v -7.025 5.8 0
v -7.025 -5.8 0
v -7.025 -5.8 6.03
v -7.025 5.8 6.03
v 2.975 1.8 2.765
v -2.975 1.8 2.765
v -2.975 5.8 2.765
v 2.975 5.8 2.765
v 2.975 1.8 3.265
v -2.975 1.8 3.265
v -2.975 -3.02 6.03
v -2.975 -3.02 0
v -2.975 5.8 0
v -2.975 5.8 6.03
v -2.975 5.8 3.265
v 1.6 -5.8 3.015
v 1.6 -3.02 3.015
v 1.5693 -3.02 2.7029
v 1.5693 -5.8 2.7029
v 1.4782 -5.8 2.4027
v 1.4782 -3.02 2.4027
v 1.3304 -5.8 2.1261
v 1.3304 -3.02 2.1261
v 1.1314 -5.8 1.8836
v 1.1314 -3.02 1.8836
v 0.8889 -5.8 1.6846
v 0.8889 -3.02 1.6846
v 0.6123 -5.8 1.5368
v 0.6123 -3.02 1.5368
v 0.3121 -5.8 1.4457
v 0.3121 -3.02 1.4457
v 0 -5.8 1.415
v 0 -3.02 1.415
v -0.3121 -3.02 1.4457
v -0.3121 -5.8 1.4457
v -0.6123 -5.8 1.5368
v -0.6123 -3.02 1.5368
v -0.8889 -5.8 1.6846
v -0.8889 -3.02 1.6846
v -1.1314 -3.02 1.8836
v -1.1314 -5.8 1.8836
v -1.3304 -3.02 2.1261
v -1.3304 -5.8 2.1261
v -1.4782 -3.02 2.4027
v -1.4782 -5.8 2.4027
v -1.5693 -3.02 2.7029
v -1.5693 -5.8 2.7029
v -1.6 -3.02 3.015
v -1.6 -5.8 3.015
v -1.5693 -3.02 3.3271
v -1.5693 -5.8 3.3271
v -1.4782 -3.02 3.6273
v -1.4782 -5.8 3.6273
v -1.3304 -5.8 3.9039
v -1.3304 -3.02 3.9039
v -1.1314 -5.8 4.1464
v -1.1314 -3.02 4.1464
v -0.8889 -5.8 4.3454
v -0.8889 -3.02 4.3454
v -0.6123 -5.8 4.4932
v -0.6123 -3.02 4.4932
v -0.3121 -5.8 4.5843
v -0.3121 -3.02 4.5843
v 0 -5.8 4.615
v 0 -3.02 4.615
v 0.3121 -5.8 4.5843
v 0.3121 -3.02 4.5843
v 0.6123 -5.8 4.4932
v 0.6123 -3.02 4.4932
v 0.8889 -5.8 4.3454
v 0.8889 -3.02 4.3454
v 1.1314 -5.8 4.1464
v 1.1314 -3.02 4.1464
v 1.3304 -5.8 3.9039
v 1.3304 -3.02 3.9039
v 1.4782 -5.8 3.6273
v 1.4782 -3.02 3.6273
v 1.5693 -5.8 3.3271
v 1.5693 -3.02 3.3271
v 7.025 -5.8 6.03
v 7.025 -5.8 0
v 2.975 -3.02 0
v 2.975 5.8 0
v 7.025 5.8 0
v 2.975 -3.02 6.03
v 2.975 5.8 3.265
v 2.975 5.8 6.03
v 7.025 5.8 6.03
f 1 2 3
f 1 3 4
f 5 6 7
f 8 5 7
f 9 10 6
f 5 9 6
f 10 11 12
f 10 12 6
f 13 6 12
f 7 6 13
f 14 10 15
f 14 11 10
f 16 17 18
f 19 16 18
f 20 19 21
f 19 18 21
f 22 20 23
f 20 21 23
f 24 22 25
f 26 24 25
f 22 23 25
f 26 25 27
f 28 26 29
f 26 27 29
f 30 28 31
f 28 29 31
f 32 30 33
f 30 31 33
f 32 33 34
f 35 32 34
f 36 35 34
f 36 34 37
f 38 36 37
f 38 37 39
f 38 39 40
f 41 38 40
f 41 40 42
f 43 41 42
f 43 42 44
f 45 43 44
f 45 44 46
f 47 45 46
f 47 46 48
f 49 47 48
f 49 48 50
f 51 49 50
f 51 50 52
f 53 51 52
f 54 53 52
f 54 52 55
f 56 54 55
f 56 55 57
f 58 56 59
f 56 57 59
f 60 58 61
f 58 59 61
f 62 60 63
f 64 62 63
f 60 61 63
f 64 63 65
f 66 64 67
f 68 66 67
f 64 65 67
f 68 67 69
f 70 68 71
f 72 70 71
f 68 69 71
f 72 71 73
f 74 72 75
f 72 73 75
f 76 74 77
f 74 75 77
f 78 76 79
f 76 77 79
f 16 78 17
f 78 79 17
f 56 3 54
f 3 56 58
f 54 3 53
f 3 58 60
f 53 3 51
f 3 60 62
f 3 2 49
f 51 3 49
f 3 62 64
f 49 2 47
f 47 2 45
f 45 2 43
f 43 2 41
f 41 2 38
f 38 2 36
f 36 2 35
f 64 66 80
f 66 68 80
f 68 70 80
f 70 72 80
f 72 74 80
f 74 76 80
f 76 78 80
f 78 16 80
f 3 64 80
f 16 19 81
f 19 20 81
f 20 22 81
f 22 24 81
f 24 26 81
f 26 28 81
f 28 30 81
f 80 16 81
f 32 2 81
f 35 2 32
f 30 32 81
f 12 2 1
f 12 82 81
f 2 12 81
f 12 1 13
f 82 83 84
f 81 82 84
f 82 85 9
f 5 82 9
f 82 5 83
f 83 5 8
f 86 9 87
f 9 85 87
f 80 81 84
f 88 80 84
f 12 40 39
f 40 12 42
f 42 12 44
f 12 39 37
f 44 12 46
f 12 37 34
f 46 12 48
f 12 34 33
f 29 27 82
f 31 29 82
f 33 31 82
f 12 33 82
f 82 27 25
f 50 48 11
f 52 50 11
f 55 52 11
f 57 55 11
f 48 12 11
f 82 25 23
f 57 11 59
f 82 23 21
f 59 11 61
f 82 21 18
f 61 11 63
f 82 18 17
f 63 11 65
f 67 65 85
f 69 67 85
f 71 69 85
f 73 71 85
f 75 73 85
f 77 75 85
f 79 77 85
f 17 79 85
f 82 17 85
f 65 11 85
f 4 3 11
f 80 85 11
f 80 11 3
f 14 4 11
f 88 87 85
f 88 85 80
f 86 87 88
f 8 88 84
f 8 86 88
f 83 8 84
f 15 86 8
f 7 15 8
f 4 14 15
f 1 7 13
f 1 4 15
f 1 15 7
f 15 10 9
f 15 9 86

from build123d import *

# Parameters (mm, degrees)
SKETCH1_W                = 14.05
SKETCH1_H                = 11.6
BOSS_EXTRUDE1_DEPTH      = 6.03
SKETCH2_W                = 5.95
SKETCH2_H                = 8.82
CUT_EXTRUDE2_DEPTH       = 6.03
SKETCH3_W                = 0.5
SKETCH3_H                = 4
BOSS_EXTRUDE2_DEPTH      = 6.03
M3_CLEARANCE_HOLE1_D     = 3.2
M3_CLEARANCE_HOLE1_DEPTH = 2.78


with BuildPart() as part:
    # Sketch1 → Boss-Extrude1 (new body)
    with BuildSketch(Plane.XY):
        Rectangle(SKETCH1_W, SKETCH1_H)
    extrude(amount=BOSS_EXTRUDE1_DEPTH)

    # Sketch2 → Cut-Extrude2 (cut)
    with BuildSketch(Plane.XY.offset(6.03)):
        with Locations((0, 1.39)):
            Rectangle(SKETCH2_W, SKETCH2_H)
    extrude(amount=-CUT_EXTRUDE2_DEPTH, mode=Mode.SUBTRACT)

    # Sketch3 → Boss-Extrude2 (add)
    with BuildSketch(Plane(origin=(-2.975, 0, 0), x_dir=(0, 0, -1), z_dir=(1, 0, 0))):
        with Locations((-3.015, 3.8)):
            Rectangle(SKETCH3_W, SKETCH3_H)
    extrude(amount=BOSS_EXTRUDE2_DEPTH)

    # M3 Clearance Hole1
    with Locations(Plane(origin=(0, -5.8, 0), x_dir=(-1, 0, 0), z_dir=(0, -1, 0))):
        with Locations((0, -3.015)):
            Hole(M3_CLEARANCE_HOLE1_D / 2, depth=M3_CLEARANCE_HOLE1_DEPTH)


solid = part.part
